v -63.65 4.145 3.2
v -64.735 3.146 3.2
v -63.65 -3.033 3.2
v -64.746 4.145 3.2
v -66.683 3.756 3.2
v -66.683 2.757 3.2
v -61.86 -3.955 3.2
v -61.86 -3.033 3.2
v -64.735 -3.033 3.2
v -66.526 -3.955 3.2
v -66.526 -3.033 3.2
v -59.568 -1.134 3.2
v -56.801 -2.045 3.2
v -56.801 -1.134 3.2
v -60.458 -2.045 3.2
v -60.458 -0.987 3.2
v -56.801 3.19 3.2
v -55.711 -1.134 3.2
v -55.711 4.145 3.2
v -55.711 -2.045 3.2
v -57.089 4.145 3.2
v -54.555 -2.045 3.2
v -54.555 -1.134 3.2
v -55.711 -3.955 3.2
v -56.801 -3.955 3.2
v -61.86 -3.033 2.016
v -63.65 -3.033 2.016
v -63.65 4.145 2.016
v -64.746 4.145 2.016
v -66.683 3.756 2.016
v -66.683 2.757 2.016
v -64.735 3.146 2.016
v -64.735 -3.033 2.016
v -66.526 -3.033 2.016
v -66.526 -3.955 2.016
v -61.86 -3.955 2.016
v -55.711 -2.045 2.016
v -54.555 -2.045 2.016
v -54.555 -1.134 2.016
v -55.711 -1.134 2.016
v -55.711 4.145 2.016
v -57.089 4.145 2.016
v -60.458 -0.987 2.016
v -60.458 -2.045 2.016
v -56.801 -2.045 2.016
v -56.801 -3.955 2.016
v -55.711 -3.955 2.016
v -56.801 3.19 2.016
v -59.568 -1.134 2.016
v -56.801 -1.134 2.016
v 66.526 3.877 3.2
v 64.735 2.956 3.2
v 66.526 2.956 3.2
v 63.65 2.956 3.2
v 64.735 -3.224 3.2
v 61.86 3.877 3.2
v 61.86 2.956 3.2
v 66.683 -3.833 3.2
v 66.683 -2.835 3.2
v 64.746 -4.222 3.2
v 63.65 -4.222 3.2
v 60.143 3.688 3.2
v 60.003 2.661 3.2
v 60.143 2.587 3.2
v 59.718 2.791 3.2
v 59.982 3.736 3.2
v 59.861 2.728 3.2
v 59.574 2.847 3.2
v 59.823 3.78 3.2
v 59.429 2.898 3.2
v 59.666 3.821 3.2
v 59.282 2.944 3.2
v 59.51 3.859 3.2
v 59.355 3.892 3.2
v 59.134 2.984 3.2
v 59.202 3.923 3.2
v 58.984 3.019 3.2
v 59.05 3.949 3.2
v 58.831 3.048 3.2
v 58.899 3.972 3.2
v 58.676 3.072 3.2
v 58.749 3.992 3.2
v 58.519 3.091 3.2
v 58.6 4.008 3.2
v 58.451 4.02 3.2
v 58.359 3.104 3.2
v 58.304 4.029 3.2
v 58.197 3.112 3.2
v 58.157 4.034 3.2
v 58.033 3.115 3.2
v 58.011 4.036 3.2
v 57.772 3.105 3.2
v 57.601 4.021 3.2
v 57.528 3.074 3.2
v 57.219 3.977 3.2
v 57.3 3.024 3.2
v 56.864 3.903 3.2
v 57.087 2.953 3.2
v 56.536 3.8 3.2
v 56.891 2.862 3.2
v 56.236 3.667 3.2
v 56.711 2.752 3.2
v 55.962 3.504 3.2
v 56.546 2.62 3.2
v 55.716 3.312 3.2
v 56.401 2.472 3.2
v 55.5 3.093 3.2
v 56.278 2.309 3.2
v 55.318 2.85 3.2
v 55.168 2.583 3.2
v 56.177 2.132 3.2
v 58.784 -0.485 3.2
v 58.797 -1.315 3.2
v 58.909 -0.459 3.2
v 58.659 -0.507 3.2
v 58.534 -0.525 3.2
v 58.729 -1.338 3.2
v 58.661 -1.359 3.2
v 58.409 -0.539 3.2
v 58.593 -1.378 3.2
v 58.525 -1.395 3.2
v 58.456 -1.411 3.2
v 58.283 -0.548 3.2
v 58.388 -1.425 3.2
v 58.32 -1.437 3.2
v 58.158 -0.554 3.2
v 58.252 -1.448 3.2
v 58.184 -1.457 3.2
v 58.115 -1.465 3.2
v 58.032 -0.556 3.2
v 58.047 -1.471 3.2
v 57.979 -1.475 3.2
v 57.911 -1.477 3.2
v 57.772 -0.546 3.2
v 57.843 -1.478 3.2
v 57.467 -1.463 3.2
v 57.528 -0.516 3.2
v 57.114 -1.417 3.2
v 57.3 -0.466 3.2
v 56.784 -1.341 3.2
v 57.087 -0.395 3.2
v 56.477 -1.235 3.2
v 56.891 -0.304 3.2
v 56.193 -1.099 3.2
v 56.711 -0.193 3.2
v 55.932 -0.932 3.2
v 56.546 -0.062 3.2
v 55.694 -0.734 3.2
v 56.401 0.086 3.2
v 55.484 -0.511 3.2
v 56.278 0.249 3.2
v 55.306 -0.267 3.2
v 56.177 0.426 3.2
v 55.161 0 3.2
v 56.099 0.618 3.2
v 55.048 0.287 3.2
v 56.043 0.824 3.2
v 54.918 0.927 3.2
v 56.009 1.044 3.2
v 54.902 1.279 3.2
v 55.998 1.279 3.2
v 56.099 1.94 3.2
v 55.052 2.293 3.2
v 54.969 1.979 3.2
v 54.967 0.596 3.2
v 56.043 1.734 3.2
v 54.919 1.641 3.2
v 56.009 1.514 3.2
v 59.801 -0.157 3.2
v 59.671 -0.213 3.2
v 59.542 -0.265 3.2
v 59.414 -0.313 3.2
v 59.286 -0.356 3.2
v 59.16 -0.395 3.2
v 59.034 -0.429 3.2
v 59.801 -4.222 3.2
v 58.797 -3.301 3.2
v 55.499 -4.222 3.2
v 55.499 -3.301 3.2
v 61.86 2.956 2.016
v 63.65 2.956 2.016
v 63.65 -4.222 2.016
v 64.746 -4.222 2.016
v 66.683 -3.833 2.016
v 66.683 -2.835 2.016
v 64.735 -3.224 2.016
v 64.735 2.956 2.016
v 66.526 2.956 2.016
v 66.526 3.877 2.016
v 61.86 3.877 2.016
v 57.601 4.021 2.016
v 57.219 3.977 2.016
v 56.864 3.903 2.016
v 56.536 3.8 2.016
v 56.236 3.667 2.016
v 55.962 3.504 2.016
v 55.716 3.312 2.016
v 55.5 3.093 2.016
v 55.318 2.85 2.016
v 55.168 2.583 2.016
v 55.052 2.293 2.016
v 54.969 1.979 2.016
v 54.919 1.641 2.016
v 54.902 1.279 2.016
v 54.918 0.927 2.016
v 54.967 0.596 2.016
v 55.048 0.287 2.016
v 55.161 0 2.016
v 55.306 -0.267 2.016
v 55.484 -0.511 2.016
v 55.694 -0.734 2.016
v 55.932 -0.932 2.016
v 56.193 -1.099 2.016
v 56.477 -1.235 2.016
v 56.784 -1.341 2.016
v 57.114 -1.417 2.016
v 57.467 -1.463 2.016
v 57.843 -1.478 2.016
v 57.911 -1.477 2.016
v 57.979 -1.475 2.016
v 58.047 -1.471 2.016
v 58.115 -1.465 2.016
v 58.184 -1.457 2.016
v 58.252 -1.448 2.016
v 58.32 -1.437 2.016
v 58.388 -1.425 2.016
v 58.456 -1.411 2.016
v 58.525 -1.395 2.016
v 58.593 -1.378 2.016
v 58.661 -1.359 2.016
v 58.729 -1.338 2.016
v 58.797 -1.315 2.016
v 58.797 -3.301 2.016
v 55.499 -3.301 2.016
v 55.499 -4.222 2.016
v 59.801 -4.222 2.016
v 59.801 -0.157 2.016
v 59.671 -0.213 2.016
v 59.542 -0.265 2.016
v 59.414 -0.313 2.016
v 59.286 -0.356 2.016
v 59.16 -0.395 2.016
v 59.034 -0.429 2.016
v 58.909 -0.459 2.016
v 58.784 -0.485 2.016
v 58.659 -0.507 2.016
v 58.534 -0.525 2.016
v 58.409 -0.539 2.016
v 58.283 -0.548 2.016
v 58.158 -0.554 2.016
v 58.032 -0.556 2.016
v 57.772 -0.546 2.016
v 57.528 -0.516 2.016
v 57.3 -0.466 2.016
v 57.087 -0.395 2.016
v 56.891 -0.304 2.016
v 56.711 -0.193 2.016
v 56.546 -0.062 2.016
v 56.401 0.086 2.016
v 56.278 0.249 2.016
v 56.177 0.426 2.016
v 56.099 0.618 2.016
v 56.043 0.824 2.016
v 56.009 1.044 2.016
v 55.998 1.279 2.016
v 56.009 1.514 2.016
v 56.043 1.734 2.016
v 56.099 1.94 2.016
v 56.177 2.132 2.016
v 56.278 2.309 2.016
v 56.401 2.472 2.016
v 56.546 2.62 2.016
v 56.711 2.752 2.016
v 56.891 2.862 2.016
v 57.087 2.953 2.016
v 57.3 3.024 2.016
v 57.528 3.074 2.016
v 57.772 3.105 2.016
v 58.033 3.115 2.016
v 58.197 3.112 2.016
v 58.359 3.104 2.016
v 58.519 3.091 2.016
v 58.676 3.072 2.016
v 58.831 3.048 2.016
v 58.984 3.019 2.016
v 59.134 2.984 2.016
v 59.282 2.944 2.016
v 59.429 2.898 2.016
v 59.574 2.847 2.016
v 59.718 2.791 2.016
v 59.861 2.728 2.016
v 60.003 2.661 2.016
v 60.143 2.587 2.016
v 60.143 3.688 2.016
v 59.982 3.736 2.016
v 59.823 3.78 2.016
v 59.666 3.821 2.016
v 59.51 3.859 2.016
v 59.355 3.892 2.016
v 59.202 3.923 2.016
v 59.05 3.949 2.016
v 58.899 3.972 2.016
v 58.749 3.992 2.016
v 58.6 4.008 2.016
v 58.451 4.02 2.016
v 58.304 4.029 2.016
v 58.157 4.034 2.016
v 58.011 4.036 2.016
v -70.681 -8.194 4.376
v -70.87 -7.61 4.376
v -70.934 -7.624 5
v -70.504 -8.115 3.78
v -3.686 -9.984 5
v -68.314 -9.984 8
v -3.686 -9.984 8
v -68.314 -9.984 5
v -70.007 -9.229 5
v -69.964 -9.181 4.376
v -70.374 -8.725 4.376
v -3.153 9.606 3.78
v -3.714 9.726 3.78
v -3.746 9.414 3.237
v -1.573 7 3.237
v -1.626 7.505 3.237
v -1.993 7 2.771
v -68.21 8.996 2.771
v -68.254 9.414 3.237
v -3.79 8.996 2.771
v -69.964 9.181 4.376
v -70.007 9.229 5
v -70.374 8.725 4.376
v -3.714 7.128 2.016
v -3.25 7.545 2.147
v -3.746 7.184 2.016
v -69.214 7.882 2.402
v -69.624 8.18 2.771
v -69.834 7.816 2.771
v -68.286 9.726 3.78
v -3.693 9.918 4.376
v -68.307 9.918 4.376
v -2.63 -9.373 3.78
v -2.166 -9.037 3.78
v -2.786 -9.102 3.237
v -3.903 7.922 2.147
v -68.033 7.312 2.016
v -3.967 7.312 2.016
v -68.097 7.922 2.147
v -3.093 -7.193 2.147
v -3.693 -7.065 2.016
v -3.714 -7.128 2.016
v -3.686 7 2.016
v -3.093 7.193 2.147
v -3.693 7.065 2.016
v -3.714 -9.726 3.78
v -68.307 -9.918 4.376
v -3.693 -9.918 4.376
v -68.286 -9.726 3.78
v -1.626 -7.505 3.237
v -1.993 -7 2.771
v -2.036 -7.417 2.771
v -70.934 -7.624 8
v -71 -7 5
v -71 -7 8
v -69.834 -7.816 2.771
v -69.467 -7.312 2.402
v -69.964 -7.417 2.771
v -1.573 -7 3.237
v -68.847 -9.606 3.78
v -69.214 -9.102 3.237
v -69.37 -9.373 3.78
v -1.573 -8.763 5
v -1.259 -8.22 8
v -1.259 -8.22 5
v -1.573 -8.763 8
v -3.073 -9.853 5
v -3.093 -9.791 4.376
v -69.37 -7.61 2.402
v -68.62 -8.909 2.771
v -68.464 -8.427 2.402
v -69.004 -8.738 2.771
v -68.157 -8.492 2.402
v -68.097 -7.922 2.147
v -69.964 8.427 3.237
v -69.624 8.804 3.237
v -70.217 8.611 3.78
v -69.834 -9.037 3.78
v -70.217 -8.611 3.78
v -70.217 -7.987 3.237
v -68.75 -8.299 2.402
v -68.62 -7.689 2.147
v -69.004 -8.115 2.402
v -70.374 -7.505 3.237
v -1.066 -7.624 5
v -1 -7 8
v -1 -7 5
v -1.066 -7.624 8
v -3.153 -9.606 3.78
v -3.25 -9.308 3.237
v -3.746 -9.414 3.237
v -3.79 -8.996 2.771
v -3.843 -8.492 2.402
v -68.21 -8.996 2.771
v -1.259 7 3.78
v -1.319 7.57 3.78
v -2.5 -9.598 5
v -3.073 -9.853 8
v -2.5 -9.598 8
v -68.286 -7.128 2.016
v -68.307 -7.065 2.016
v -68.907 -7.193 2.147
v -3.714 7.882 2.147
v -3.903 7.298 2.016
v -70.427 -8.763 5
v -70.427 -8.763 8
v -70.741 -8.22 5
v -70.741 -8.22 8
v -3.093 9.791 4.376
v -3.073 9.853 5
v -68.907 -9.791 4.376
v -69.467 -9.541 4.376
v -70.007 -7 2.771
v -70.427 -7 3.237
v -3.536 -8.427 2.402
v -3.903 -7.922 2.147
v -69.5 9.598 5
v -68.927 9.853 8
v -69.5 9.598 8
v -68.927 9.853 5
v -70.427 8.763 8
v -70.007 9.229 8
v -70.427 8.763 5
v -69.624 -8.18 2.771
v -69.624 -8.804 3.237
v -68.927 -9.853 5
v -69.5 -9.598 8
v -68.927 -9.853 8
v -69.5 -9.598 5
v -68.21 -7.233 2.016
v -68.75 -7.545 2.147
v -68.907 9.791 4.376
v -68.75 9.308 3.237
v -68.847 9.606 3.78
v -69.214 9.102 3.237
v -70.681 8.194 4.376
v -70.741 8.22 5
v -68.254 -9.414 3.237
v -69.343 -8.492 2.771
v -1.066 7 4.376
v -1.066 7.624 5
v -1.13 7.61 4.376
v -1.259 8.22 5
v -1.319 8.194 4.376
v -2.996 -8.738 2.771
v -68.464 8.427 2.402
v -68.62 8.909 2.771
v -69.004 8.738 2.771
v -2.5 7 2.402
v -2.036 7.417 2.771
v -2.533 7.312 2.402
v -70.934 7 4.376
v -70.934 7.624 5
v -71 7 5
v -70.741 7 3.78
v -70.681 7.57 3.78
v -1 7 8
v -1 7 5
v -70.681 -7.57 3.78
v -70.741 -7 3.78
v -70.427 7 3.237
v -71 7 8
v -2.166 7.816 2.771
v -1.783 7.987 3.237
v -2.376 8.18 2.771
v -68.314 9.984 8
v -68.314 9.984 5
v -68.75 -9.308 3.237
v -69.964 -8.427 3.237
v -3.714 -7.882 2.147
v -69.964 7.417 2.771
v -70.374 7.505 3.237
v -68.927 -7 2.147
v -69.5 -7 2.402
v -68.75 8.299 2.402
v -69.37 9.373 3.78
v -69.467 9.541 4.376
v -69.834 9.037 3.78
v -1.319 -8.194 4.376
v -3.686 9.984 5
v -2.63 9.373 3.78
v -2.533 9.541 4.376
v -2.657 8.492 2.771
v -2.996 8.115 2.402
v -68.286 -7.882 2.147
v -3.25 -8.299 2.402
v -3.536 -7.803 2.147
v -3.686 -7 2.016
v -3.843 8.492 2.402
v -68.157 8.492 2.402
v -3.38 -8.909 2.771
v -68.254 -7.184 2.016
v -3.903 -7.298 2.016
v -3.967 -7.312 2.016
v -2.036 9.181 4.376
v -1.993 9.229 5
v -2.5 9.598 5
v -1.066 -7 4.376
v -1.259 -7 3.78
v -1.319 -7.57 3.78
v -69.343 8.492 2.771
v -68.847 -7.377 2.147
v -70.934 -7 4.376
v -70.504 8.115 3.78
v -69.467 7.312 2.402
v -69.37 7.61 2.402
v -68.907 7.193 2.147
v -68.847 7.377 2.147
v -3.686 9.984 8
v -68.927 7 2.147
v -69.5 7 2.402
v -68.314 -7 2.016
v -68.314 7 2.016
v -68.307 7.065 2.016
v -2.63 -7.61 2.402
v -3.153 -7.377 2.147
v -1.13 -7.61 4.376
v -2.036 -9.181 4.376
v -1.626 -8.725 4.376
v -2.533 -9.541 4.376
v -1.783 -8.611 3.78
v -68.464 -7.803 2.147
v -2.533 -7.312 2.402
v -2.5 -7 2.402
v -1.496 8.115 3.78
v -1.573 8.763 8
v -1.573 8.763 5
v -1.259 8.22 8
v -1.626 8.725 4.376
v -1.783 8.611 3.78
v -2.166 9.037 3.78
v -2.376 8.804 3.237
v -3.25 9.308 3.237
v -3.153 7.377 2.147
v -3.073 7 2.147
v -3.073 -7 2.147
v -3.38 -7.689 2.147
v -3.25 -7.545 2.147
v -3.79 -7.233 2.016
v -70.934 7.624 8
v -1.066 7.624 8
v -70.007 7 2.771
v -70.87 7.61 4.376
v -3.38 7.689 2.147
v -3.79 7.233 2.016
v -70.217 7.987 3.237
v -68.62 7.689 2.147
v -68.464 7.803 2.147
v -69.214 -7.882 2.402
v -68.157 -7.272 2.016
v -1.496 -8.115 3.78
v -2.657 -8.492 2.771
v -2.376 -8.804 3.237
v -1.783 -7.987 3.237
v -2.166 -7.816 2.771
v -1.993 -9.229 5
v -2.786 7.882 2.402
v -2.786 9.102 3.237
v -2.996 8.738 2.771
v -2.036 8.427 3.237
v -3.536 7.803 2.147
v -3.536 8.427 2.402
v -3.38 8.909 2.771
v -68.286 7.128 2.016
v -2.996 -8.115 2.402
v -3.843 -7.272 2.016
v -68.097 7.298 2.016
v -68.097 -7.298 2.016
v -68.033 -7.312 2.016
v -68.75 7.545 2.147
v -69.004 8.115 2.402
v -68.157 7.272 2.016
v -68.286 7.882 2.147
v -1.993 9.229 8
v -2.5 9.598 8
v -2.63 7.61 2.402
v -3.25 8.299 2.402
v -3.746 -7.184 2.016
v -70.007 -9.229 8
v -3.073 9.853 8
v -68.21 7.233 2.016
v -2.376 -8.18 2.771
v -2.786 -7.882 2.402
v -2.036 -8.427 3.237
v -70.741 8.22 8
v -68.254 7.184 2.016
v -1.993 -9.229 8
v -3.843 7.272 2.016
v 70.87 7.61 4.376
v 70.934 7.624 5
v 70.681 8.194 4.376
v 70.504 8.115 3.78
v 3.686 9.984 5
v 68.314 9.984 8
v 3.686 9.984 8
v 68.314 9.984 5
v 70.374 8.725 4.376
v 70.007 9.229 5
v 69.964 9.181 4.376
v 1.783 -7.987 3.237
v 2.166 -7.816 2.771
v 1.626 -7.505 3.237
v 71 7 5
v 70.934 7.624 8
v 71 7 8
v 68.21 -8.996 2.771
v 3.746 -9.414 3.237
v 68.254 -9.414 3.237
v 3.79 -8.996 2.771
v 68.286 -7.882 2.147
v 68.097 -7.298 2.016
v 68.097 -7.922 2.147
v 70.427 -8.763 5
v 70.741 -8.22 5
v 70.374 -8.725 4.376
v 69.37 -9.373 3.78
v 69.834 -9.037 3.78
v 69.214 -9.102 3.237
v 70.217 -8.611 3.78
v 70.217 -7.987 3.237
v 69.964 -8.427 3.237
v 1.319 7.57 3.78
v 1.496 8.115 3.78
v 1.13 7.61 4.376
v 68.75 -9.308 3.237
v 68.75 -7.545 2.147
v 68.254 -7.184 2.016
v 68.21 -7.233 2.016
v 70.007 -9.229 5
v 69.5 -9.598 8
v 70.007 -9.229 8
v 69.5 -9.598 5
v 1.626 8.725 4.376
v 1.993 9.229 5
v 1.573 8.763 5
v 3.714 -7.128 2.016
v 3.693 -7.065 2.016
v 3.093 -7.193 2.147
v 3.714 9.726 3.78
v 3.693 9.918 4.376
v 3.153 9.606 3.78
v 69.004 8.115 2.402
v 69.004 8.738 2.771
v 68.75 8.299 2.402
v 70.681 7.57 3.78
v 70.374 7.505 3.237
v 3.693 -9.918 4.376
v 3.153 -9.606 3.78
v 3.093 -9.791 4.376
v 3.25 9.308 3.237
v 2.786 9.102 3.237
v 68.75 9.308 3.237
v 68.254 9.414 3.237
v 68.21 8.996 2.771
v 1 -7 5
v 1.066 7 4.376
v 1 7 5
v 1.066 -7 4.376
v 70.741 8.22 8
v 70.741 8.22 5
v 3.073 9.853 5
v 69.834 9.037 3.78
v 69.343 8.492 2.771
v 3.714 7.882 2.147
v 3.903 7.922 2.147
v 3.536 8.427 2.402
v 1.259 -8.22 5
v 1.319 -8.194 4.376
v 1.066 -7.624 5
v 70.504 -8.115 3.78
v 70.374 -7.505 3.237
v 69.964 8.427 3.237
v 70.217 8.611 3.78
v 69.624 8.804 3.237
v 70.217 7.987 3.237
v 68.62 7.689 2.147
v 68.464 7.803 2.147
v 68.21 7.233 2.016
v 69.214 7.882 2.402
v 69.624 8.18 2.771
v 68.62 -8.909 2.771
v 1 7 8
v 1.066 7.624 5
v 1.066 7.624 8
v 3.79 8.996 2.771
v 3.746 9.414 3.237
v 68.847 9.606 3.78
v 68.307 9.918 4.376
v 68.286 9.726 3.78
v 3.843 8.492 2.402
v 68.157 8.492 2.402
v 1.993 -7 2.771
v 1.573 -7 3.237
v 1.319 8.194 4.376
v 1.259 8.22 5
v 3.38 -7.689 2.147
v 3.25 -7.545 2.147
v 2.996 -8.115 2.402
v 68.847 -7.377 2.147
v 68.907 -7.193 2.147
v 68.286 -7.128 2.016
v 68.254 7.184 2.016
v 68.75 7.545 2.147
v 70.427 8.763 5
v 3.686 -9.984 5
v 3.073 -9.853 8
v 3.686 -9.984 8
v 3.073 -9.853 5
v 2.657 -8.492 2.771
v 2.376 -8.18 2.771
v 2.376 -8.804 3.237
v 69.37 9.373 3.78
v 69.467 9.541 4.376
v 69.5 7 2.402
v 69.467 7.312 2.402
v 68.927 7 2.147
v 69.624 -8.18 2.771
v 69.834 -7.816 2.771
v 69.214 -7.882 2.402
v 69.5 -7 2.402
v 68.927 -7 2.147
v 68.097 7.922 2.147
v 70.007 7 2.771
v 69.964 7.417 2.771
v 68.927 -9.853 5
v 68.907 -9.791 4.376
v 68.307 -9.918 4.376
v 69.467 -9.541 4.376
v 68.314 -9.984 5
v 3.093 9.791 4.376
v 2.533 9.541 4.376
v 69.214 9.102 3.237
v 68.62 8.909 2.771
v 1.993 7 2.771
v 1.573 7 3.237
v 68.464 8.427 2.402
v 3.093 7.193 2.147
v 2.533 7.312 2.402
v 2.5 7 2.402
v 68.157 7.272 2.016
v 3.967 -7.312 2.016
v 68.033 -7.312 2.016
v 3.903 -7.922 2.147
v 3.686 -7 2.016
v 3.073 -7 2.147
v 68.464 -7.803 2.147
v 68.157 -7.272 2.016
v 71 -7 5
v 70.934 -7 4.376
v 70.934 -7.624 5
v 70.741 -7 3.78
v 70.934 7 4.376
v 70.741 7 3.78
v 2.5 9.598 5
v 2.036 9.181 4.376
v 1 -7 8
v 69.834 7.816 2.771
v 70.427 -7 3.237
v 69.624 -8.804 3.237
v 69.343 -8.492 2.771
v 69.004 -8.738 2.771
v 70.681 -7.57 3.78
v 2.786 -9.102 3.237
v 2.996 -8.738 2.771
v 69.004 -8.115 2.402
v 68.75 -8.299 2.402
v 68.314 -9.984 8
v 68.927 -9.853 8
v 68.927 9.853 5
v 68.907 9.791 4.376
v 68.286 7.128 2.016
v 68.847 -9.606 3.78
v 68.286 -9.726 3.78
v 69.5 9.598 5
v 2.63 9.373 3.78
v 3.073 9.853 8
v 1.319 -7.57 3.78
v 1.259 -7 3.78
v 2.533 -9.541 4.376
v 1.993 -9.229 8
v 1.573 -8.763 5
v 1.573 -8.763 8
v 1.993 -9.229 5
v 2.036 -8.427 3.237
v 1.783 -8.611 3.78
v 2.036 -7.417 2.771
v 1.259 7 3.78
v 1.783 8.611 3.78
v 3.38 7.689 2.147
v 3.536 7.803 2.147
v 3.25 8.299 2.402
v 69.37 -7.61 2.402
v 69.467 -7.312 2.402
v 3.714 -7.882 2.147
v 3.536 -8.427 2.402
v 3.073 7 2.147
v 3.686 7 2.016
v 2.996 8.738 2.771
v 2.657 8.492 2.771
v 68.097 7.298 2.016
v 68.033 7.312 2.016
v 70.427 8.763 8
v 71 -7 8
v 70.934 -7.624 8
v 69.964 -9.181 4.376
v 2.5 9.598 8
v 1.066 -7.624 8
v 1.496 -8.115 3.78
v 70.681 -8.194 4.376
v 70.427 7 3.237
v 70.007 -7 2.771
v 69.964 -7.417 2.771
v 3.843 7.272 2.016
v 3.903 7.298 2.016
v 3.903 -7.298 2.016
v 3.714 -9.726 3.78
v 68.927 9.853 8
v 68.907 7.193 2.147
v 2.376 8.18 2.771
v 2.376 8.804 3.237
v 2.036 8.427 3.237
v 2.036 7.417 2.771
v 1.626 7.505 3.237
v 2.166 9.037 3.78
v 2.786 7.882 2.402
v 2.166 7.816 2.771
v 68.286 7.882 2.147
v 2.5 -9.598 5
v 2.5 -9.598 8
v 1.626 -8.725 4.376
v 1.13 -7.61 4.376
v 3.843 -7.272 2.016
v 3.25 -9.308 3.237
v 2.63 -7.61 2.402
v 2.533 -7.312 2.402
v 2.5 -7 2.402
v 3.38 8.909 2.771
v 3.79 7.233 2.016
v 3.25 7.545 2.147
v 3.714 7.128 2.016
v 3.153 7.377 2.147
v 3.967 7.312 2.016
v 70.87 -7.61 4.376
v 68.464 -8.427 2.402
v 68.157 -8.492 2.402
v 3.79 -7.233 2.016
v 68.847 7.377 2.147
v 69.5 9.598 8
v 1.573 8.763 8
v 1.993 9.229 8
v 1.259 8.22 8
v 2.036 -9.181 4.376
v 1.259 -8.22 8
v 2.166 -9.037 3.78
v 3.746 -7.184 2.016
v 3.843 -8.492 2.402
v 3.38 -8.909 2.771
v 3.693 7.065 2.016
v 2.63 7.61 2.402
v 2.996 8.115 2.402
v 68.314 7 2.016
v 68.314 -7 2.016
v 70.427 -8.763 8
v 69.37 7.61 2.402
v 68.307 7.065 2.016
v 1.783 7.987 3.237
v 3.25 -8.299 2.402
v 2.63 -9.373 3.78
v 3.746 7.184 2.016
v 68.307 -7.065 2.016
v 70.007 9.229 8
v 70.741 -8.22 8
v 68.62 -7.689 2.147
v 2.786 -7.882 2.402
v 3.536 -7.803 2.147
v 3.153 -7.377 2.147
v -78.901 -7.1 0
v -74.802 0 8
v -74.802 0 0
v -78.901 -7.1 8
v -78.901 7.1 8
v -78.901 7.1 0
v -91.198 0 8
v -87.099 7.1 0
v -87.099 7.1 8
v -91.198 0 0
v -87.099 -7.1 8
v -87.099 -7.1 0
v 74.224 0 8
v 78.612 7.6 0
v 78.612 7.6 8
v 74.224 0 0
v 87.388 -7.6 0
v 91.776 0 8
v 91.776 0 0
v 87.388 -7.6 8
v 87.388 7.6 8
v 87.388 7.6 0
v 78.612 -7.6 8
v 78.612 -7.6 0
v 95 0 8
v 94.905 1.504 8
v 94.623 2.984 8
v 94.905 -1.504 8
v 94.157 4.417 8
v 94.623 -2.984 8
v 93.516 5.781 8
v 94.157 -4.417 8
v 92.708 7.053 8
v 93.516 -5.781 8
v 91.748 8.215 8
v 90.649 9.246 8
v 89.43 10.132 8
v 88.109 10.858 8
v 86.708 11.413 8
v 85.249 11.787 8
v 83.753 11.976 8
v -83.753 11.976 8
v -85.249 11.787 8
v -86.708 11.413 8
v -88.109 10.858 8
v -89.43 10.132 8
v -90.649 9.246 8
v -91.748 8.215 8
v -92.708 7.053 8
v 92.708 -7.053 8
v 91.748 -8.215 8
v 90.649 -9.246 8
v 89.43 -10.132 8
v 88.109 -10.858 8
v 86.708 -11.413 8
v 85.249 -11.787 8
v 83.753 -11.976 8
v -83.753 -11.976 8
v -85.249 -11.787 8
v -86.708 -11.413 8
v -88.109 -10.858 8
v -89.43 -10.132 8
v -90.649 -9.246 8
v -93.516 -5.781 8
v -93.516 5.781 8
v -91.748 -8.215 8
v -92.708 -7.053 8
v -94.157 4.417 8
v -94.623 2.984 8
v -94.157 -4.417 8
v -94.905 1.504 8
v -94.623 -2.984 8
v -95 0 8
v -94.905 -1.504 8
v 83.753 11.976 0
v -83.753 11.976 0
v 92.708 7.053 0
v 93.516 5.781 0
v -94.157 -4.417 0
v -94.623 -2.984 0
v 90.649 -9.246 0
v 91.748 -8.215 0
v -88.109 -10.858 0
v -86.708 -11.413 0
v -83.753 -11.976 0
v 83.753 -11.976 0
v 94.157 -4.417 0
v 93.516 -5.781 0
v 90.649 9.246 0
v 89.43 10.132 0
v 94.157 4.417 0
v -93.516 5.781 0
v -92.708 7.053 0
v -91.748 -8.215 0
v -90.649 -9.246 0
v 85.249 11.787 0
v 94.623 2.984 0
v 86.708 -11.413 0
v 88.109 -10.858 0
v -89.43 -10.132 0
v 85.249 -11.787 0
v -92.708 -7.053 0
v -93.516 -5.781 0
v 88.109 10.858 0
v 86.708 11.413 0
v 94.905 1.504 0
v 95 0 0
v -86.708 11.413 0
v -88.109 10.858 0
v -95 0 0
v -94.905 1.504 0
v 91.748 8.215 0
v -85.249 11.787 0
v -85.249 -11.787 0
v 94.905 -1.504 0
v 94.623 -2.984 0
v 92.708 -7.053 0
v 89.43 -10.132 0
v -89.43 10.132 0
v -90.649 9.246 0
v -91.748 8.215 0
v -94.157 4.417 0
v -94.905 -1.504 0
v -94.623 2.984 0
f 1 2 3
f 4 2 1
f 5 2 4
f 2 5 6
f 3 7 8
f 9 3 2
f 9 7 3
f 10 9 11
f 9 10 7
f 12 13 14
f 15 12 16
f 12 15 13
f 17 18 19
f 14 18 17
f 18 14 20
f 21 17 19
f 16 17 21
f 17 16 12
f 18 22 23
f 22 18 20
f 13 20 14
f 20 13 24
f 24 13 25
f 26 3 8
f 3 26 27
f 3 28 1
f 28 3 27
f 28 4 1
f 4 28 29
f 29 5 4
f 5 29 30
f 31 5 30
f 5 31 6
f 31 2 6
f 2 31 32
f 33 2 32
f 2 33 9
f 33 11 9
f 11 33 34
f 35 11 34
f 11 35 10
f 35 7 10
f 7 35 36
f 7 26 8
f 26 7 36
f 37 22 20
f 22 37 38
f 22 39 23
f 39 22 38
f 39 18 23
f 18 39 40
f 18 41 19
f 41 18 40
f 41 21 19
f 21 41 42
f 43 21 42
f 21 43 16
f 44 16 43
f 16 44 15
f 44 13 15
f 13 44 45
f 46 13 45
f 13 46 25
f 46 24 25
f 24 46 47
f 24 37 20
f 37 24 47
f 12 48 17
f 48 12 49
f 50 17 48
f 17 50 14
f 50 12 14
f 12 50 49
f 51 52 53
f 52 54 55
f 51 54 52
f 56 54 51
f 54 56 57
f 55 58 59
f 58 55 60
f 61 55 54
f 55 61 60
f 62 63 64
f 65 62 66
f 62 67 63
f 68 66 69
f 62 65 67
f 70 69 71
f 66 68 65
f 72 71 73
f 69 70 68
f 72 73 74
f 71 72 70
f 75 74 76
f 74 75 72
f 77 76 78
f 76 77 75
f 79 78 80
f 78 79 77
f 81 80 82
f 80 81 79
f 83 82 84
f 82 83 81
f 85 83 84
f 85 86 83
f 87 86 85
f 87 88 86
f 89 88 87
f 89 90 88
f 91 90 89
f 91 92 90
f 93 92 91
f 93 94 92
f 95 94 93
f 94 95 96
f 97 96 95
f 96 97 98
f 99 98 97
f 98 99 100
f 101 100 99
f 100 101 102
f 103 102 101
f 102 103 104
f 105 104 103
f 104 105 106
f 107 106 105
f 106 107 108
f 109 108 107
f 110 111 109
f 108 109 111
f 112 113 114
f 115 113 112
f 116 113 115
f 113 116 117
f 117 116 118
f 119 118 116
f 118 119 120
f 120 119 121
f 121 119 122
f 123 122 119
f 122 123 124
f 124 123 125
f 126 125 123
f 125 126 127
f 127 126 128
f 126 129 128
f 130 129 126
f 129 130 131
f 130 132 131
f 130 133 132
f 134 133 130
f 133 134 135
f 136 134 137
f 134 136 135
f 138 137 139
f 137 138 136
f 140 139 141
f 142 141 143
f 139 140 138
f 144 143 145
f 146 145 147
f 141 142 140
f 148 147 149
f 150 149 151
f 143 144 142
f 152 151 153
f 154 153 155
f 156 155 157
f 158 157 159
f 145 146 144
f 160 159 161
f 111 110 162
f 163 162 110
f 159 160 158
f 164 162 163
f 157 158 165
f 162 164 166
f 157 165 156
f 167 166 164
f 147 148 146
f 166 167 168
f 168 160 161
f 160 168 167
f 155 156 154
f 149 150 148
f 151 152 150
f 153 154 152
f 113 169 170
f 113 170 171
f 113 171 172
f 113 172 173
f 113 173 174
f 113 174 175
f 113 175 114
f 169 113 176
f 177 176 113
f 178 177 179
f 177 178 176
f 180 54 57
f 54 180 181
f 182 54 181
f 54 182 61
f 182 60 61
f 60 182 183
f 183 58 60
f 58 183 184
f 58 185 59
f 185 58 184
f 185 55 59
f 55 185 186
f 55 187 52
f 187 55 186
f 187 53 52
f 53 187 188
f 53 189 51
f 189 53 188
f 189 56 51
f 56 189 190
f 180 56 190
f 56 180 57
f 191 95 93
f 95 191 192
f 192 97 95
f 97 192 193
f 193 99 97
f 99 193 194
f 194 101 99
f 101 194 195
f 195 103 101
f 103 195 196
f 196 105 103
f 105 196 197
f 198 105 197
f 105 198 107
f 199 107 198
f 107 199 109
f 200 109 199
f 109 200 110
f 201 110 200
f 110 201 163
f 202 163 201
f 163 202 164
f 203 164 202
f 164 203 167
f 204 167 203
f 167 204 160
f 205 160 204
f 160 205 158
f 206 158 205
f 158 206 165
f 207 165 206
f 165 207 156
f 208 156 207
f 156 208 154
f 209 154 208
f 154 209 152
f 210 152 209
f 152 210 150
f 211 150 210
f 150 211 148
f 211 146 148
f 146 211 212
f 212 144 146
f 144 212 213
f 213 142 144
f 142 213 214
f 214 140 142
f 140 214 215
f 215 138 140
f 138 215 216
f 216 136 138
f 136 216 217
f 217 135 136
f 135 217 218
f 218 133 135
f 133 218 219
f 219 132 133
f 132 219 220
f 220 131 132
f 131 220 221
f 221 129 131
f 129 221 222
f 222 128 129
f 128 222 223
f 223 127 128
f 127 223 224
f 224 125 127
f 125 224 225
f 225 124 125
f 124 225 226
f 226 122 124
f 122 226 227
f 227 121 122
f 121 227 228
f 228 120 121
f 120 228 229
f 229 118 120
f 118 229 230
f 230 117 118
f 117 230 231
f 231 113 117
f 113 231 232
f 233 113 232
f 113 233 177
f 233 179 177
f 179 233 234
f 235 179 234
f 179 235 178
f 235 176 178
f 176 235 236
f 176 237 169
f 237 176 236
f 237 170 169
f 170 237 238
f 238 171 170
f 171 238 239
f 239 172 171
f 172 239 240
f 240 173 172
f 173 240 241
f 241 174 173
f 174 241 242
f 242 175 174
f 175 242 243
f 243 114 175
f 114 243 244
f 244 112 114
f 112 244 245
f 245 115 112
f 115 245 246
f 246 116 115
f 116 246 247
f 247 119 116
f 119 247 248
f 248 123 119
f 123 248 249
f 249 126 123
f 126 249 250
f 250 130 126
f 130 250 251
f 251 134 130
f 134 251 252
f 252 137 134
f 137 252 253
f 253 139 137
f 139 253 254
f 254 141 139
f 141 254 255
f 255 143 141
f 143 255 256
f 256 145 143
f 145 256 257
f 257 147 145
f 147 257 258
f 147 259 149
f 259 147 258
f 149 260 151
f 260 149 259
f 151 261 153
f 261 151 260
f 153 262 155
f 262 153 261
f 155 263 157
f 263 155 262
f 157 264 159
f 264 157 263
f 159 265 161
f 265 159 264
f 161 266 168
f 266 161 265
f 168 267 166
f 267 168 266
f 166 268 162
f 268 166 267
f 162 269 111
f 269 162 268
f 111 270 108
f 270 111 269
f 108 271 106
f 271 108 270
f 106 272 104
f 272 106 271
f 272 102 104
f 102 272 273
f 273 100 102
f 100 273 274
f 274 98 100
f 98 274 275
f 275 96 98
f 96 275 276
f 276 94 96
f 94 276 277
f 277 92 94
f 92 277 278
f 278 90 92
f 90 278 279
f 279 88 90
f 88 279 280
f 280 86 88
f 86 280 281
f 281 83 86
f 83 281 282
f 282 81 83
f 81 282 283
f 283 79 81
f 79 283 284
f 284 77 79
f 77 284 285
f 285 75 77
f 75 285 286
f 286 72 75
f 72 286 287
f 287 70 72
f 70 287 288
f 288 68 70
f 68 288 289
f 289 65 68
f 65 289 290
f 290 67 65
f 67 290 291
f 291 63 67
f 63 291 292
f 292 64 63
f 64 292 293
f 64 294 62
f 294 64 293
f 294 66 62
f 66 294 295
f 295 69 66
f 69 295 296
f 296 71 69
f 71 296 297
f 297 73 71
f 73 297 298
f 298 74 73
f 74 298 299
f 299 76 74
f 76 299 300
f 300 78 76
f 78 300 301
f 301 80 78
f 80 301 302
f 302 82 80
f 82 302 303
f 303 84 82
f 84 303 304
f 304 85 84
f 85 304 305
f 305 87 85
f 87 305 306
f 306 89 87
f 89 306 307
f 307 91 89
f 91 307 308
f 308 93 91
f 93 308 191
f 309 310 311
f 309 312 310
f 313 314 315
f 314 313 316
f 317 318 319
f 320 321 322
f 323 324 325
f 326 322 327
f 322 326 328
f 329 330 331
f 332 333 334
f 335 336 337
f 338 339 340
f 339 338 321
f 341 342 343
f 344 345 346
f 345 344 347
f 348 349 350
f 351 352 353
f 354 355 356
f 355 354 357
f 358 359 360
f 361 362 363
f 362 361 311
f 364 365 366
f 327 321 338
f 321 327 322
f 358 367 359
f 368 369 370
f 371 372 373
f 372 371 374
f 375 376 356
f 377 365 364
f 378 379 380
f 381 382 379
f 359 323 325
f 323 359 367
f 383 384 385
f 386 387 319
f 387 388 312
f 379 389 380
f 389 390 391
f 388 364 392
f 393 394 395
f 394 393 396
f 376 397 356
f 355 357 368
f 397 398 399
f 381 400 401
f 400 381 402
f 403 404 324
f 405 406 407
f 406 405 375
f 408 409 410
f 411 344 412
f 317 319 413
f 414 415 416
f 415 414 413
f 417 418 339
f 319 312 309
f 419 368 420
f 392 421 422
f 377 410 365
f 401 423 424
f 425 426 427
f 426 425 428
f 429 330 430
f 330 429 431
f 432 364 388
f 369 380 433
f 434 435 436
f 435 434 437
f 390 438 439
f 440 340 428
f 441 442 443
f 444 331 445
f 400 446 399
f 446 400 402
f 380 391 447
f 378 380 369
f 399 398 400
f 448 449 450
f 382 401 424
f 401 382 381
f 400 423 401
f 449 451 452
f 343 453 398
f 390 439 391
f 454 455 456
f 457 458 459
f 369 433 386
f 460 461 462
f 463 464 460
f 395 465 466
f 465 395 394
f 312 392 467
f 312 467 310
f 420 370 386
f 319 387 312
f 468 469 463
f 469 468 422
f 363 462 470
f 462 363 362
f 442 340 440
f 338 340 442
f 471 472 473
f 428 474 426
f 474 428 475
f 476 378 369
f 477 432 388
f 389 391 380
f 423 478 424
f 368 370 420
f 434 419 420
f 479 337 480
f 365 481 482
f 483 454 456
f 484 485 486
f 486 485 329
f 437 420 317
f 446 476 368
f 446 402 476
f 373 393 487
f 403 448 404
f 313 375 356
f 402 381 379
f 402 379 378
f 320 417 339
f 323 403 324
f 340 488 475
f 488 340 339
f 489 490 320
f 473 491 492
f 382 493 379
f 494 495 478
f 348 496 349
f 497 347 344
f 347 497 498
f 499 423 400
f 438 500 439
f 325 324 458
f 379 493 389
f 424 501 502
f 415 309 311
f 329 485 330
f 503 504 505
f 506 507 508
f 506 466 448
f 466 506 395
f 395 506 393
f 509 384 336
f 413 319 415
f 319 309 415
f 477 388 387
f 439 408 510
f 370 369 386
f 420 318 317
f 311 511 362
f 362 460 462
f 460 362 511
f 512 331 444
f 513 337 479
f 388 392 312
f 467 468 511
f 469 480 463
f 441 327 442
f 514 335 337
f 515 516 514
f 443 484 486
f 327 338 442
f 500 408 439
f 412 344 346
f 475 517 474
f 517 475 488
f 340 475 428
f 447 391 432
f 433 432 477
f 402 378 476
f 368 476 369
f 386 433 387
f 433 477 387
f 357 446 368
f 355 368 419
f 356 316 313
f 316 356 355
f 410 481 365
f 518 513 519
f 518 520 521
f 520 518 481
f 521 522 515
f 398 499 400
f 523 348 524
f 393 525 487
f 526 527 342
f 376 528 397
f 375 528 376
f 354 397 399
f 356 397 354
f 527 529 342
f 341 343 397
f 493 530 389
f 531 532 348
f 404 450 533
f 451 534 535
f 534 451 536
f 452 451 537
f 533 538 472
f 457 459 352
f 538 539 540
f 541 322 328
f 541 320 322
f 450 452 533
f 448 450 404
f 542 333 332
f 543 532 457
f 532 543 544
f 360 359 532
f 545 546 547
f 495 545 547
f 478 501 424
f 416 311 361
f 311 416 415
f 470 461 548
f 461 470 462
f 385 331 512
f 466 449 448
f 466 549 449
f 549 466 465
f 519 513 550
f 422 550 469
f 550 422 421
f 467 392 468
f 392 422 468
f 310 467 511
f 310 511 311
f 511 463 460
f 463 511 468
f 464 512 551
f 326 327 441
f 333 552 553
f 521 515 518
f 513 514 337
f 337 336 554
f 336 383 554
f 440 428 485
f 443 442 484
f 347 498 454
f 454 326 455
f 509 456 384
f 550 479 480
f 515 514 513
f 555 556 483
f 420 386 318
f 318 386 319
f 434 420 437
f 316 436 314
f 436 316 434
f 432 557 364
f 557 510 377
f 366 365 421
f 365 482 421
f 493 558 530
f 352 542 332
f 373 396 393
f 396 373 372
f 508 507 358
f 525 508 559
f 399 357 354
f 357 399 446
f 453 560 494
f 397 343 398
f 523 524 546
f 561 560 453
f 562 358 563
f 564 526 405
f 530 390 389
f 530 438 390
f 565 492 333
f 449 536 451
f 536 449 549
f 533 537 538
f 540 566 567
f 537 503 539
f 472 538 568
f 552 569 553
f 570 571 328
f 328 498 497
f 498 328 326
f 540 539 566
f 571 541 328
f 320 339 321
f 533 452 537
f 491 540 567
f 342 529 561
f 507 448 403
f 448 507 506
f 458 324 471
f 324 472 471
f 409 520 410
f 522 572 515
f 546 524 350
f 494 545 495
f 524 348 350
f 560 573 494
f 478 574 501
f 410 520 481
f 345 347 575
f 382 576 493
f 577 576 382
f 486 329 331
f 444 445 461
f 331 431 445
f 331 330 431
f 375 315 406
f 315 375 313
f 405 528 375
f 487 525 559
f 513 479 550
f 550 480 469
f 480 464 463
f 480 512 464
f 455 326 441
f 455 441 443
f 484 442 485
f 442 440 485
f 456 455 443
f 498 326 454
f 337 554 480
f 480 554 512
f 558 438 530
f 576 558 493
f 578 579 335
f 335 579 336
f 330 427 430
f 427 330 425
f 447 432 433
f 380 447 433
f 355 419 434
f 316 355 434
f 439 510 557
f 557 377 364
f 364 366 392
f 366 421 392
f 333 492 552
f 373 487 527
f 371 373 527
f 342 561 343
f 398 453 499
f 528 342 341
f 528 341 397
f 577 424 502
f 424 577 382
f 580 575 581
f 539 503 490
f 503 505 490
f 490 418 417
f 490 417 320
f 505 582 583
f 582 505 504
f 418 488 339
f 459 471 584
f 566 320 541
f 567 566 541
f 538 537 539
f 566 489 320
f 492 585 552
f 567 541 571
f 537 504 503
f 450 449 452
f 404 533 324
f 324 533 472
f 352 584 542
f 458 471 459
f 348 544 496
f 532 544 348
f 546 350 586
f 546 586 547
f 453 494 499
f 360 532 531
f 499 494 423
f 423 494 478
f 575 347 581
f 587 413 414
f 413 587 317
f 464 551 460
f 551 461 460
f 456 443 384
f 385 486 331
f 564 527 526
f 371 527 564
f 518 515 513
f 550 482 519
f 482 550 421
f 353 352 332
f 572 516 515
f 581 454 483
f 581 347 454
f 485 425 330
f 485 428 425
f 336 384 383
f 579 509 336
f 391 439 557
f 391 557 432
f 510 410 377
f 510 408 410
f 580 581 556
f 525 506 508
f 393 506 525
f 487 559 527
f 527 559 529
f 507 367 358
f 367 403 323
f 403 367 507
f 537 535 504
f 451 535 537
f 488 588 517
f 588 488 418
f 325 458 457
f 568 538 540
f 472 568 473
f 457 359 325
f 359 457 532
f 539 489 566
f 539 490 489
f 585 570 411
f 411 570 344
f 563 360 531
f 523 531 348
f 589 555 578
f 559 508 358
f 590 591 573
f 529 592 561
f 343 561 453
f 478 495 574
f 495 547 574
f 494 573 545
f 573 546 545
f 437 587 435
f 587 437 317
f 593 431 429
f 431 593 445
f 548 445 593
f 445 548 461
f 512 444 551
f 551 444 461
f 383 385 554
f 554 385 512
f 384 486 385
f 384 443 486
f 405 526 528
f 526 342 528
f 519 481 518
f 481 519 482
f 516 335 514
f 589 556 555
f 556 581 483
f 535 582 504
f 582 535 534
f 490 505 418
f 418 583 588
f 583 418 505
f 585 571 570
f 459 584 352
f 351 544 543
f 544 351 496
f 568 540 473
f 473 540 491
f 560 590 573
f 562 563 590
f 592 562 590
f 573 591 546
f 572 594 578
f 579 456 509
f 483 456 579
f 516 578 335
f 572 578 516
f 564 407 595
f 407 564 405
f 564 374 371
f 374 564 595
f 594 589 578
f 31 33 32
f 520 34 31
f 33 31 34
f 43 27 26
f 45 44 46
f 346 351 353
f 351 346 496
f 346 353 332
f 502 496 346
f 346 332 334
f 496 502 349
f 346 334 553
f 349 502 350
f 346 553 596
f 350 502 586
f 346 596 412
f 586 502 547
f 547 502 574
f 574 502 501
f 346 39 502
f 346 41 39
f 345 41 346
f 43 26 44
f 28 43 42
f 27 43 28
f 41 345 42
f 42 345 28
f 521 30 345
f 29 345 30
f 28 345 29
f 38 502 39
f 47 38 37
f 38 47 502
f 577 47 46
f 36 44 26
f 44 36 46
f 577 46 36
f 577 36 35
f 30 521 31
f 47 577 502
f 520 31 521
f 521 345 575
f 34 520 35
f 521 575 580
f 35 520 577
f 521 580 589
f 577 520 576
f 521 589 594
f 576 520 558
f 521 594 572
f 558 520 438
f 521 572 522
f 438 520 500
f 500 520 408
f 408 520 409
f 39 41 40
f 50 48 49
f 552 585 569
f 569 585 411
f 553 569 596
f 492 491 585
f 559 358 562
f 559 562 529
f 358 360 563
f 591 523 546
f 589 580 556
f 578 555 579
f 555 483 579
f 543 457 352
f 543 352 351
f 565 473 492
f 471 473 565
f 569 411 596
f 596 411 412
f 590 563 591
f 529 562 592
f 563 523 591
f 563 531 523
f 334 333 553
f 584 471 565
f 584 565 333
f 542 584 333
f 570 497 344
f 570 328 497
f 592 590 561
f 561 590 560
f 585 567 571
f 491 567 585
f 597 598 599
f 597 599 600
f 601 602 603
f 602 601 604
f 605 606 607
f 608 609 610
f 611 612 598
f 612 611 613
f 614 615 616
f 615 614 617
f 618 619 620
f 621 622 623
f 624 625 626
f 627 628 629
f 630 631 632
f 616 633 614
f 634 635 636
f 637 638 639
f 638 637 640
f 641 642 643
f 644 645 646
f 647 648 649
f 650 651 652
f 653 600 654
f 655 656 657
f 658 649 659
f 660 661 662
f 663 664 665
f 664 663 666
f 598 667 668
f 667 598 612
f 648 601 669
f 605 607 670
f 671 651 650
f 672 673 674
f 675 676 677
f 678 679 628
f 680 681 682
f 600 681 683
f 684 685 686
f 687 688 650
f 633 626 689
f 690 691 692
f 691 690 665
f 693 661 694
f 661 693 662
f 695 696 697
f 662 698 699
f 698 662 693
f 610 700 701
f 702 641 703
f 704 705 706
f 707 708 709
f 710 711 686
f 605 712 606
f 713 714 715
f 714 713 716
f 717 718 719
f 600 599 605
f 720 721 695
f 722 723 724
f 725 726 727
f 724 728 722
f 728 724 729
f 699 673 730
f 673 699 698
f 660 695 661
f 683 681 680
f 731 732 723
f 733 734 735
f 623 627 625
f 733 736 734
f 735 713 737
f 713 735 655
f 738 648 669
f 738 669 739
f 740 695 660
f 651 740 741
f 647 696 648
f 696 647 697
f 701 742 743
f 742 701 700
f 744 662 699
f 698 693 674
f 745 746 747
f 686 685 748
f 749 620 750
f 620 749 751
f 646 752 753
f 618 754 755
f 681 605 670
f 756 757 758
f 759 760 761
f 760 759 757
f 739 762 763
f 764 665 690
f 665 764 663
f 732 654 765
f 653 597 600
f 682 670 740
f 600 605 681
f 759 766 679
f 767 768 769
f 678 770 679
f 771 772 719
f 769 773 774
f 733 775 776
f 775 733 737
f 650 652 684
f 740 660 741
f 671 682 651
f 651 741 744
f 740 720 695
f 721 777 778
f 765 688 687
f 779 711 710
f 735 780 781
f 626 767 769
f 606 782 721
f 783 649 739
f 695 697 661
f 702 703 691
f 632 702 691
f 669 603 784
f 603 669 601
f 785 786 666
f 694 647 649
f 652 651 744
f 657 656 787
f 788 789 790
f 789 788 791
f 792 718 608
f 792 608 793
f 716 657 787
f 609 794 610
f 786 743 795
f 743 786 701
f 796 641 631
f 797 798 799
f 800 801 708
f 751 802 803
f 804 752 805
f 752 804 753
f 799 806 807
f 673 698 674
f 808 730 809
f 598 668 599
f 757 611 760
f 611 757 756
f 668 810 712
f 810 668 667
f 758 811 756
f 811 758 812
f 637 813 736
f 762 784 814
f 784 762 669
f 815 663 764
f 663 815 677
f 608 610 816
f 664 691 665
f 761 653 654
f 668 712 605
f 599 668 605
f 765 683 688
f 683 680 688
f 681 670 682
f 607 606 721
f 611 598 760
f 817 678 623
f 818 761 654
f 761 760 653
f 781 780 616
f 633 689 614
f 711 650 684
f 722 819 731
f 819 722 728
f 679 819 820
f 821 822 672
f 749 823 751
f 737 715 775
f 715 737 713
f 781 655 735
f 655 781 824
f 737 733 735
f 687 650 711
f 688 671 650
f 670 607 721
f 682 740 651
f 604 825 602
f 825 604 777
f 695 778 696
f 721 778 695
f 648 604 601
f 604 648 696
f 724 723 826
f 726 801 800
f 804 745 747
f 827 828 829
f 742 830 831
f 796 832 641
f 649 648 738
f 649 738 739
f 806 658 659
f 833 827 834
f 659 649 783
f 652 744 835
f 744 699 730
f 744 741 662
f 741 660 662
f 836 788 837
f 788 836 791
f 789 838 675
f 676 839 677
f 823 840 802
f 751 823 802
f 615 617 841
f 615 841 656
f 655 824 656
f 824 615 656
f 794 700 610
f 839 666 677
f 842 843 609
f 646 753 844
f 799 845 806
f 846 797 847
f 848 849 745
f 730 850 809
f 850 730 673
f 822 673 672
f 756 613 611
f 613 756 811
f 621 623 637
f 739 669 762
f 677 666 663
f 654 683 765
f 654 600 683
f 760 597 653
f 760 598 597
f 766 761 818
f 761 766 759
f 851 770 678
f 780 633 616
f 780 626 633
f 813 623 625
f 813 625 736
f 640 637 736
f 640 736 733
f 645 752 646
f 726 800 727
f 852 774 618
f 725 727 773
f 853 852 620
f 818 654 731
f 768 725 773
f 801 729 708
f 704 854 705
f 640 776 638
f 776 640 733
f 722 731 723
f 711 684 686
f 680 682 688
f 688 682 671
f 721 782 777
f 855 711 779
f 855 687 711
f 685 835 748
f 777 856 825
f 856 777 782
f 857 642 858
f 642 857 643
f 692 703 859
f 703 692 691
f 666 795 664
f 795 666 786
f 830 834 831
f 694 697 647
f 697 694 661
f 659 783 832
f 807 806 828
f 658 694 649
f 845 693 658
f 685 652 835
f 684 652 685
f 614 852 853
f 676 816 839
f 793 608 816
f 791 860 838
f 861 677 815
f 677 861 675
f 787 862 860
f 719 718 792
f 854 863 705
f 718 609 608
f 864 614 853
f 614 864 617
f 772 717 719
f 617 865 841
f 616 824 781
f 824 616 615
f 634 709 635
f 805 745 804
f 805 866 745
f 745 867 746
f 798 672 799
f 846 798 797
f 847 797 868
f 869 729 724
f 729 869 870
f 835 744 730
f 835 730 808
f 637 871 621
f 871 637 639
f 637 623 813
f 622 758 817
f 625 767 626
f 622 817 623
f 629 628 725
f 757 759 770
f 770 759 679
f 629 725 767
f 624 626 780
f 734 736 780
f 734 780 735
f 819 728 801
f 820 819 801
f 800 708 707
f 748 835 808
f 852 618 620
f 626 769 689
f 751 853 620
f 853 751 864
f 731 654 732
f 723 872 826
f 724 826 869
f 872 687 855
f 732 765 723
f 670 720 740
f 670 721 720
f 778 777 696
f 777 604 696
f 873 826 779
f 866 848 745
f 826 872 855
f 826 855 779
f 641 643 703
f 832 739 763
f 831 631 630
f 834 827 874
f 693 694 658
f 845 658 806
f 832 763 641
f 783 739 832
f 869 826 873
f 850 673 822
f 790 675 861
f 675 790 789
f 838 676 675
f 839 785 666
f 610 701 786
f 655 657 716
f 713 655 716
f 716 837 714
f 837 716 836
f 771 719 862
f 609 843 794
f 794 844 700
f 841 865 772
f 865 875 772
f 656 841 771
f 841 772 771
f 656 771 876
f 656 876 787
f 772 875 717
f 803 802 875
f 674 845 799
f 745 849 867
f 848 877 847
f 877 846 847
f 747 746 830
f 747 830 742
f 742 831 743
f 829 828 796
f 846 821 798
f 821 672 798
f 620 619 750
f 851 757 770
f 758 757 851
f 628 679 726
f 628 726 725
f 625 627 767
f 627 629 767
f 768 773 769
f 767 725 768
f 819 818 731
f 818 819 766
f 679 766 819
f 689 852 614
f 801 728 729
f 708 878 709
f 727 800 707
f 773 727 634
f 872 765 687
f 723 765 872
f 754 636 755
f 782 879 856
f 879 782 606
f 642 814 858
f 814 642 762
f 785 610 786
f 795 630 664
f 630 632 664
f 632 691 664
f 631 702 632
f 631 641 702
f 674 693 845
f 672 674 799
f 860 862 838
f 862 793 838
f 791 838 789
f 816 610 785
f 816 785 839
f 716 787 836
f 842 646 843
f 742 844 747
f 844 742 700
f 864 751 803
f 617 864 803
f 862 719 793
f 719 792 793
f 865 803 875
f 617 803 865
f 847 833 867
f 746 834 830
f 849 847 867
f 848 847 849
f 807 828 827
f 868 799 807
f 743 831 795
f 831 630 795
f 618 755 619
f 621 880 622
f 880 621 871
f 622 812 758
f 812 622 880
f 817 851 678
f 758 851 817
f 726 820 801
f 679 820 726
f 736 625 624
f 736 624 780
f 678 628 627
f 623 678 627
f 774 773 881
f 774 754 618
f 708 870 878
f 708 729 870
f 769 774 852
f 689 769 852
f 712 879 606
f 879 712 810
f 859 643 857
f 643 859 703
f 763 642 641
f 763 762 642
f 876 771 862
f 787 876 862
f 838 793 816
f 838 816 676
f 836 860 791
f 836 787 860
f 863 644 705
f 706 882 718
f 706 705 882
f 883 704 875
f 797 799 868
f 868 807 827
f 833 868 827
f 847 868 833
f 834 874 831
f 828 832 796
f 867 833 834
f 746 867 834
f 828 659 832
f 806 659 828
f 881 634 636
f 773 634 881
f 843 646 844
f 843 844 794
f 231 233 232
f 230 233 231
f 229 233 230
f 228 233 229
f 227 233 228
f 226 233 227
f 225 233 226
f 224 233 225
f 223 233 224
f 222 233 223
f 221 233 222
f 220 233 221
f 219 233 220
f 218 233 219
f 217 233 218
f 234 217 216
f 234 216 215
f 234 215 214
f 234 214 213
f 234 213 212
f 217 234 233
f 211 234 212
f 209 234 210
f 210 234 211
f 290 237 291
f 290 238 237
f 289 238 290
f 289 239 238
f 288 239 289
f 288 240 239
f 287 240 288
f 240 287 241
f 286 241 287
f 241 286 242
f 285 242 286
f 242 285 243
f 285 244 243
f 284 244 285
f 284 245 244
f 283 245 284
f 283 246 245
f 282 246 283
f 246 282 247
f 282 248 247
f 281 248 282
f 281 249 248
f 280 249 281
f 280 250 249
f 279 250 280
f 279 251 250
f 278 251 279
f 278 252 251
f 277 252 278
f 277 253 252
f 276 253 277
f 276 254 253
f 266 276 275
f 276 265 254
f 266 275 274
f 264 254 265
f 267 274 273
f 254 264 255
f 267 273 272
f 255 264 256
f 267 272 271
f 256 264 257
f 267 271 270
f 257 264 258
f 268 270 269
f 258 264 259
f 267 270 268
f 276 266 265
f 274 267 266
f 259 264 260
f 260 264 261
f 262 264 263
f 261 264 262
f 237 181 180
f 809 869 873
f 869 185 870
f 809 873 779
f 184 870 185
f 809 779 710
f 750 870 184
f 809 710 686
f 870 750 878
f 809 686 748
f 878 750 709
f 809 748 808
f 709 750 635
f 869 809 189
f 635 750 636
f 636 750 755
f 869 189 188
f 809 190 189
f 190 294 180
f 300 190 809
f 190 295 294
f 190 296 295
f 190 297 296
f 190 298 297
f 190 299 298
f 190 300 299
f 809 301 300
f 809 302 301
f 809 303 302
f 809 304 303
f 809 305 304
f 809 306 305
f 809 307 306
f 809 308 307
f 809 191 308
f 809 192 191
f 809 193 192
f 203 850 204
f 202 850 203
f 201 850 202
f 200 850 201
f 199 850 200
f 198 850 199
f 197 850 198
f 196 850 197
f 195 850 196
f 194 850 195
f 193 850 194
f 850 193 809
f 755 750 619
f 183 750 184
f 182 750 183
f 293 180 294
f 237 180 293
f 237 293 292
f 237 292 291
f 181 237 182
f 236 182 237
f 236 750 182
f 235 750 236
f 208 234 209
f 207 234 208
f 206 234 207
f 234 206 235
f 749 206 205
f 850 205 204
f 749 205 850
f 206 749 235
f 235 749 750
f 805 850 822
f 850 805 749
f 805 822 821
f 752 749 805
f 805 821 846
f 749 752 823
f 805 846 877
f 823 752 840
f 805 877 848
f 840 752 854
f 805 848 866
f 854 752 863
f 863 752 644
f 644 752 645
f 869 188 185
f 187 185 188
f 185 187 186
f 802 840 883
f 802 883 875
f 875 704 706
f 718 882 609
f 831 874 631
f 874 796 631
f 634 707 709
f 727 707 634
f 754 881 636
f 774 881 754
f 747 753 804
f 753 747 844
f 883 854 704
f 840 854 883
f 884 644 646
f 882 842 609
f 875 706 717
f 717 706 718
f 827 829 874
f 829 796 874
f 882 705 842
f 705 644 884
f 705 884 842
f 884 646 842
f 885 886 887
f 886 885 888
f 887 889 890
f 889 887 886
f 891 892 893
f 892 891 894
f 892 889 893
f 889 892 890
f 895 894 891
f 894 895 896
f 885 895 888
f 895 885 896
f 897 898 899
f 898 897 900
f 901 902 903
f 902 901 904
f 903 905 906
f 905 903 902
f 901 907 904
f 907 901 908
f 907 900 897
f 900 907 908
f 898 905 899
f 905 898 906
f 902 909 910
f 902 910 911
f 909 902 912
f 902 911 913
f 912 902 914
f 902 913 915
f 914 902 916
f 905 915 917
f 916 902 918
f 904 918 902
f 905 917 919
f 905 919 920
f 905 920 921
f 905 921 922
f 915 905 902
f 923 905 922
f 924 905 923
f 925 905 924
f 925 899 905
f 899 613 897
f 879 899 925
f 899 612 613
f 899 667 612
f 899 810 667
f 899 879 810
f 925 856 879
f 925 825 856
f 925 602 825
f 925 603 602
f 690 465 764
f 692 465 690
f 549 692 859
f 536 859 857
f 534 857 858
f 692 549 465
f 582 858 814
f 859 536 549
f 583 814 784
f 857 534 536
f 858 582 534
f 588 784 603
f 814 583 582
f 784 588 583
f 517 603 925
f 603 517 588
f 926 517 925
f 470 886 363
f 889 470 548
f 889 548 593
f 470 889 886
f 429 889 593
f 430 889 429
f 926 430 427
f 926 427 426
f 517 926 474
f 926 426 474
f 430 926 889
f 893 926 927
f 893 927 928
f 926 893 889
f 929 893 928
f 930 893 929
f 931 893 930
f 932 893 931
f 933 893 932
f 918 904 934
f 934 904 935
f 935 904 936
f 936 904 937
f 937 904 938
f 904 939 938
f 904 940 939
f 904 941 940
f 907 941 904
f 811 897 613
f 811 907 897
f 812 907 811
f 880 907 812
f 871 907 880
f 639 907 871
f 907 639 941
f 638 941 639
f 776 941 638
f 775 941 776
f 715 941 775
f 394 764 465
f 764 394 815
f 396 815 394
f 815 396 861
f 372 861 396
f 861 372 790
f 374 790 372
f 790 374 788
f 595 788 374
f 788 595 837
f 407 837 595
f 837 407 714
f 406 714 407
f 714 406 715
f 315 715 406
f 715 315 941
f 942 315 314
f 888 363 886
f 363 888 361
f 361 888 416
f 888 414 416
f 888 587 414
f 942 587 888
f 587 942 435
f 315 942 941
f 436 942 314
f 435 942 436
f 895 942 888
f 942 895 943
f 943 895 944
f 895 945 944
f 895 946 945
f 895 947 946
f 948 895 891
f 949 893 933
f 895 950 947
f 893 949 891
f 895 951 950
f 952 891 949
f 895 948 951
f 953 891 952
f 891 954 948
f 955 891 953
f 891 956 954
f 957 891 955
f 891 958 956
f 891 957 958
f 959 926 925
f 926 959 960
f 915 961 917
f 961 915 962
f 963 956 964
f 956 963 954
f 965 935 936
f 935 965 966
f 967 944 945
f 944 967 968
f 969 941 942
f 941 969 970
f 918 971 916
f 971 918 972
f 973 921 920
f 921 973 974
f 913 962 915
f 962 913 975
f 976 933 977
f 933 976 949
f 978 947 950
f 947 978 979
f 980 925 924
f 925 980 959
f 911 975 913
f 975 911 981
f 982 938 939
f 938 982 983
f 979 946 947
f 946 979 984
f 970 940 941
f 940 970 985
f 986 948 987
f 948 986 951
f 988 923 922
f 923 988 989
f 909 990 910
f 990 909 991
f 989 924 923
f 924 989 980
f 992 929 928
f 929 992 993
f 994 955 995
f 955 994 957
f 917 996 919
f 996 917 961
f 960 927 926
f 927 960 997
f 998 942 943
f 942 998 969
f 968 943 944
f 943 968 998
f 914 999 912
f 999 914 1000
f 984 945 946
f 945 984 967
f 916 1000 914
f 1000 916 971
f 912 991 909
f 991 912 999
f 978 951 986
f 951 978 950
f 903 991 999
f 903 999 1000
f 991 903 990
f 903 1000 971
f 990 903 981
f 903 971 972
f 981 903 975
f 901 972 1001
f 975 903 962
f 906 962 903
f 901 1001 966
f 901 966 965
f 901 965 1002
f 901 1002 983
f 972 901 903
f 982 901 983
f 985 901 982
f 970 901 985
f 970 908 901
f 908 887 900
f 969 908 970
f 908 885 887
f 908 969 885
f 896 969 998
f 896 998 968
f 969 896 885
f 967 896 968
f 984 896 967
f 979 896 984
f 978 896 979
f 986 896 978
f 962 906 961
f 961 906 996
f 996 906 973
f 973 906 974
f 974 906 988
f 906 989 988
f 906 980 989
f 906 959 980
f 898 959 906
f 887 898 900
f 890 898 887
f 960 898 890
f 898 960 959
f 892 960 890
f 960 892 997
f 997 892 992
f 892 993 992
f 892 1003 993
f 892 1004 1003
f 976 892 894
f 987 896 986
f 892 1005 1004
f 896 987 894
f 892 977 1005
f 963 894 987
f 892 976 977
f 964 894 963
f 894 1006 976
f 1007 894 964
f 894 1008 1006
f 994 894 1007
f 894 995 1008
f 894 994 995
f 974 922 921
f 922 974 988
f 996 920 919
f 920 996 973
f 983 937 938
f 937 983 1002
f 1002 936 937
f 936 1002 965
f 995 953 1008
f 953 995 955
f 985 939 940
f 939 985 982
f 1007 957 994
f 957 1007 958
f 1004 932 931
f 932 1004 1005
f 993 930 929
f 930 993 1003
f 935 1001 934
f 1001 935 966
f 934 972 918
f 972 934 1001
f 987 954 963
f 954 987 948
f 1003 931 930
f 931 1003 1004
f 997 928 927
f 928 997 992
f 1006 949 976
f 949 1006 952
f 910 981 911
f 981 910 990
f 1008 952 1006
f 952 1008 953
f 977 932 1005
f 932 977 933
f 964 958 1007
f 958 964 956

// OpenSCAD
// file: lib/utils.scad
module xz_toward_y()
{
	scale([1, 1, -1])
	rotate([-90,0,0])
	children();
}

module anchor(dim, anchor=[0,0,0])
{
	translate([-(1+anchor.x)*dim.x/2, -(1+anchor.y)*dim.y/2, -(1+anchor.z)*dim.z/2])
	children();
}

module block(dim, anchor=[0,0,0])
{
	anchor(dim, anchor)
	cube(dim);
}

module rounded_block_z(dim, anchor=[0,0,0], r=0)
{
	anchor(dim, anchor)
	linear_extrude(dim.z)
	hull()
	for (p=[ [r,r], [dim.x-r, r], [dim.x-r, dim.y-r], [r, dim.y-r] ] )
	translate(p)
	circle(r);
}

module rounded_block_y(dim, anchor=[0,0,0], r=0)
{
	anchor(dim, anchor)
	xz_toward_y()
	linear_extrude(dim.y)
	hull()
	for (p=[ [r,r], [dim.x-r, r], [dim.x-r, dim.z-r], [r, dim.z-r] ] )
	translate(p)
	circle(r);
}

module chamfer_block_y(dim, anchor=[0,0,0], r=0)
{
	anchor(dim, anchor)
	hull()
	{
		translate([r,0,0])
		cube([dim.x-r*2, dim.y, dim.z]);

		translate([0,0,r])
		cube([dim.x, dim.y, dim.z-r*2]);
	}
}

module chamfer_block_z(dim, anchor=[0,0,0], r=0)
{
	anchor(dim, anchor)
	hull()
	{
		translate([r,0,0])
		cube([dim.x-r*2, dim.y, dim.z]);

		translate([0,r,0])
		cube([dim.x, dim.y-r*2, dim.z]);
	}
}

module chamfer_block(dim, anchor=[0,0,0], r=0)
{
	anchor(dim, anchor)
	hull()
	{
		translate([r,r,0])
		cube([dim.x-r*2, dim.y-r*2, dim.z]);

		translate([r,0,r])
		cube([dim.x-r*2, dim.y, dim.z-r*2]);

		translate([0,r,r])
		cube([dim.x, dim.y-r*2, dim.z-r*2]);
	}
}

module at_grid(c,r,pitch,anchor=[0,0,0])
{
	dim=[(c-1)*pitch,(r-1)*pitch,1];
	a=[anchor[0],anchor[1],-1];
	anchor(dim,a)
	for(x=[0:c-1])
	for(y=[0:r-1])
	translate([x*pitch,y*pitch,0])
	children();
}

module ngon_outer(n,h,r)
{
	cylinder(h,r=r, $fn=n);
}

module ngon_inner(n,h,r)
{
	a=360/n/2;
	r_cyl = r/cos(a);
	rotate([0,0,a])
	cylinder(h,r=r_cyl, $fn=n);
}


module ngon_cone_outer(n,h,r1,r2)
{
	cylinder(h,r1=r1,r2=r2, $fn=n);
}

module ngon_cone_inner(n,h,r1,r2)
{
	a=360/n/2;
	r1_cyl = r1/cos(a);
	r2_cyl = r2/cos(a);
	rotate([0,0,a])
	cylinder(h,r1=r1_cyl,r2=r2_cyl, $fn=n);
}

module preview()
{
	if ($preview)
	children();
}
// main file
e=.001;
m=.2; /* extra margin for the fdm squish factor */
$fn=50;

include <lib/utils.scad>;

size_a = 14;
size_b = 15;

length = 190;

width=24;

border=2;

thickness=8;
carveout_r = 4;

text_size = 8;
text_height=1.2;
text_font="Atkinson Hyperlegible";

test_thickness=2;


hole_to_hole = length-width;

carveout_r_min = 0;
carveout_z = thickness-border;
carveout_y = width-border*2;

carveout_r_calc = min(carveout_r, carveout_z/2, carveout_y/2);

assert(carveout_r_calc >= carveout_r_min);

module at_holes()
{
	translate([-hole_to_hole/2,0,0])
	{
		$nut = size_a;
		children();
	}

	rotate([0,0,180])
	translate([-hole_to_hole/2,0,0])
	{
		$nut = size_b;
		children();
	}
}

module ring_cutout(nut_size)
{
	translate([0,0,-e])
	rotate([0,0,360/6/2])
	ngon_inner(6, thickness+e*2, r=nut_size/2+m/2);
}

module wrench()
{
	at_holes()
	translate([width/2+carveout_y/2,0,border-e])
	linear_extrude(text_height+e)
	text(str($nut), font=text_font, size=text_size, halign="center", valign="center");

	difference()
	{
		hull()
		at_holes()
		cylinder(h=thickness, d=width);

		at_holes()
		hull()
		{
			y_off = carveout_y/2-carveout_r_calc;


			for (x = [width/2+carveout_r_calc,hole_to_hole/2-carveout_r_calc-border/2 ])
			for (y = [-y_off, y_off ])
			for (z = [border+carveout_r_calc, thickness+carveout_r_calc])
			translate([x,y,z])
			sphere(r=carveout_r_calc, $fn=30);
		}

		at_holes()
		ring_cutout($nut);
	}
}

module hole_test()
{
	difference()
	{
		cylinder(h=test_thickness, d=width);
		ring_cutout(size_a);
	}
}

wrench();
